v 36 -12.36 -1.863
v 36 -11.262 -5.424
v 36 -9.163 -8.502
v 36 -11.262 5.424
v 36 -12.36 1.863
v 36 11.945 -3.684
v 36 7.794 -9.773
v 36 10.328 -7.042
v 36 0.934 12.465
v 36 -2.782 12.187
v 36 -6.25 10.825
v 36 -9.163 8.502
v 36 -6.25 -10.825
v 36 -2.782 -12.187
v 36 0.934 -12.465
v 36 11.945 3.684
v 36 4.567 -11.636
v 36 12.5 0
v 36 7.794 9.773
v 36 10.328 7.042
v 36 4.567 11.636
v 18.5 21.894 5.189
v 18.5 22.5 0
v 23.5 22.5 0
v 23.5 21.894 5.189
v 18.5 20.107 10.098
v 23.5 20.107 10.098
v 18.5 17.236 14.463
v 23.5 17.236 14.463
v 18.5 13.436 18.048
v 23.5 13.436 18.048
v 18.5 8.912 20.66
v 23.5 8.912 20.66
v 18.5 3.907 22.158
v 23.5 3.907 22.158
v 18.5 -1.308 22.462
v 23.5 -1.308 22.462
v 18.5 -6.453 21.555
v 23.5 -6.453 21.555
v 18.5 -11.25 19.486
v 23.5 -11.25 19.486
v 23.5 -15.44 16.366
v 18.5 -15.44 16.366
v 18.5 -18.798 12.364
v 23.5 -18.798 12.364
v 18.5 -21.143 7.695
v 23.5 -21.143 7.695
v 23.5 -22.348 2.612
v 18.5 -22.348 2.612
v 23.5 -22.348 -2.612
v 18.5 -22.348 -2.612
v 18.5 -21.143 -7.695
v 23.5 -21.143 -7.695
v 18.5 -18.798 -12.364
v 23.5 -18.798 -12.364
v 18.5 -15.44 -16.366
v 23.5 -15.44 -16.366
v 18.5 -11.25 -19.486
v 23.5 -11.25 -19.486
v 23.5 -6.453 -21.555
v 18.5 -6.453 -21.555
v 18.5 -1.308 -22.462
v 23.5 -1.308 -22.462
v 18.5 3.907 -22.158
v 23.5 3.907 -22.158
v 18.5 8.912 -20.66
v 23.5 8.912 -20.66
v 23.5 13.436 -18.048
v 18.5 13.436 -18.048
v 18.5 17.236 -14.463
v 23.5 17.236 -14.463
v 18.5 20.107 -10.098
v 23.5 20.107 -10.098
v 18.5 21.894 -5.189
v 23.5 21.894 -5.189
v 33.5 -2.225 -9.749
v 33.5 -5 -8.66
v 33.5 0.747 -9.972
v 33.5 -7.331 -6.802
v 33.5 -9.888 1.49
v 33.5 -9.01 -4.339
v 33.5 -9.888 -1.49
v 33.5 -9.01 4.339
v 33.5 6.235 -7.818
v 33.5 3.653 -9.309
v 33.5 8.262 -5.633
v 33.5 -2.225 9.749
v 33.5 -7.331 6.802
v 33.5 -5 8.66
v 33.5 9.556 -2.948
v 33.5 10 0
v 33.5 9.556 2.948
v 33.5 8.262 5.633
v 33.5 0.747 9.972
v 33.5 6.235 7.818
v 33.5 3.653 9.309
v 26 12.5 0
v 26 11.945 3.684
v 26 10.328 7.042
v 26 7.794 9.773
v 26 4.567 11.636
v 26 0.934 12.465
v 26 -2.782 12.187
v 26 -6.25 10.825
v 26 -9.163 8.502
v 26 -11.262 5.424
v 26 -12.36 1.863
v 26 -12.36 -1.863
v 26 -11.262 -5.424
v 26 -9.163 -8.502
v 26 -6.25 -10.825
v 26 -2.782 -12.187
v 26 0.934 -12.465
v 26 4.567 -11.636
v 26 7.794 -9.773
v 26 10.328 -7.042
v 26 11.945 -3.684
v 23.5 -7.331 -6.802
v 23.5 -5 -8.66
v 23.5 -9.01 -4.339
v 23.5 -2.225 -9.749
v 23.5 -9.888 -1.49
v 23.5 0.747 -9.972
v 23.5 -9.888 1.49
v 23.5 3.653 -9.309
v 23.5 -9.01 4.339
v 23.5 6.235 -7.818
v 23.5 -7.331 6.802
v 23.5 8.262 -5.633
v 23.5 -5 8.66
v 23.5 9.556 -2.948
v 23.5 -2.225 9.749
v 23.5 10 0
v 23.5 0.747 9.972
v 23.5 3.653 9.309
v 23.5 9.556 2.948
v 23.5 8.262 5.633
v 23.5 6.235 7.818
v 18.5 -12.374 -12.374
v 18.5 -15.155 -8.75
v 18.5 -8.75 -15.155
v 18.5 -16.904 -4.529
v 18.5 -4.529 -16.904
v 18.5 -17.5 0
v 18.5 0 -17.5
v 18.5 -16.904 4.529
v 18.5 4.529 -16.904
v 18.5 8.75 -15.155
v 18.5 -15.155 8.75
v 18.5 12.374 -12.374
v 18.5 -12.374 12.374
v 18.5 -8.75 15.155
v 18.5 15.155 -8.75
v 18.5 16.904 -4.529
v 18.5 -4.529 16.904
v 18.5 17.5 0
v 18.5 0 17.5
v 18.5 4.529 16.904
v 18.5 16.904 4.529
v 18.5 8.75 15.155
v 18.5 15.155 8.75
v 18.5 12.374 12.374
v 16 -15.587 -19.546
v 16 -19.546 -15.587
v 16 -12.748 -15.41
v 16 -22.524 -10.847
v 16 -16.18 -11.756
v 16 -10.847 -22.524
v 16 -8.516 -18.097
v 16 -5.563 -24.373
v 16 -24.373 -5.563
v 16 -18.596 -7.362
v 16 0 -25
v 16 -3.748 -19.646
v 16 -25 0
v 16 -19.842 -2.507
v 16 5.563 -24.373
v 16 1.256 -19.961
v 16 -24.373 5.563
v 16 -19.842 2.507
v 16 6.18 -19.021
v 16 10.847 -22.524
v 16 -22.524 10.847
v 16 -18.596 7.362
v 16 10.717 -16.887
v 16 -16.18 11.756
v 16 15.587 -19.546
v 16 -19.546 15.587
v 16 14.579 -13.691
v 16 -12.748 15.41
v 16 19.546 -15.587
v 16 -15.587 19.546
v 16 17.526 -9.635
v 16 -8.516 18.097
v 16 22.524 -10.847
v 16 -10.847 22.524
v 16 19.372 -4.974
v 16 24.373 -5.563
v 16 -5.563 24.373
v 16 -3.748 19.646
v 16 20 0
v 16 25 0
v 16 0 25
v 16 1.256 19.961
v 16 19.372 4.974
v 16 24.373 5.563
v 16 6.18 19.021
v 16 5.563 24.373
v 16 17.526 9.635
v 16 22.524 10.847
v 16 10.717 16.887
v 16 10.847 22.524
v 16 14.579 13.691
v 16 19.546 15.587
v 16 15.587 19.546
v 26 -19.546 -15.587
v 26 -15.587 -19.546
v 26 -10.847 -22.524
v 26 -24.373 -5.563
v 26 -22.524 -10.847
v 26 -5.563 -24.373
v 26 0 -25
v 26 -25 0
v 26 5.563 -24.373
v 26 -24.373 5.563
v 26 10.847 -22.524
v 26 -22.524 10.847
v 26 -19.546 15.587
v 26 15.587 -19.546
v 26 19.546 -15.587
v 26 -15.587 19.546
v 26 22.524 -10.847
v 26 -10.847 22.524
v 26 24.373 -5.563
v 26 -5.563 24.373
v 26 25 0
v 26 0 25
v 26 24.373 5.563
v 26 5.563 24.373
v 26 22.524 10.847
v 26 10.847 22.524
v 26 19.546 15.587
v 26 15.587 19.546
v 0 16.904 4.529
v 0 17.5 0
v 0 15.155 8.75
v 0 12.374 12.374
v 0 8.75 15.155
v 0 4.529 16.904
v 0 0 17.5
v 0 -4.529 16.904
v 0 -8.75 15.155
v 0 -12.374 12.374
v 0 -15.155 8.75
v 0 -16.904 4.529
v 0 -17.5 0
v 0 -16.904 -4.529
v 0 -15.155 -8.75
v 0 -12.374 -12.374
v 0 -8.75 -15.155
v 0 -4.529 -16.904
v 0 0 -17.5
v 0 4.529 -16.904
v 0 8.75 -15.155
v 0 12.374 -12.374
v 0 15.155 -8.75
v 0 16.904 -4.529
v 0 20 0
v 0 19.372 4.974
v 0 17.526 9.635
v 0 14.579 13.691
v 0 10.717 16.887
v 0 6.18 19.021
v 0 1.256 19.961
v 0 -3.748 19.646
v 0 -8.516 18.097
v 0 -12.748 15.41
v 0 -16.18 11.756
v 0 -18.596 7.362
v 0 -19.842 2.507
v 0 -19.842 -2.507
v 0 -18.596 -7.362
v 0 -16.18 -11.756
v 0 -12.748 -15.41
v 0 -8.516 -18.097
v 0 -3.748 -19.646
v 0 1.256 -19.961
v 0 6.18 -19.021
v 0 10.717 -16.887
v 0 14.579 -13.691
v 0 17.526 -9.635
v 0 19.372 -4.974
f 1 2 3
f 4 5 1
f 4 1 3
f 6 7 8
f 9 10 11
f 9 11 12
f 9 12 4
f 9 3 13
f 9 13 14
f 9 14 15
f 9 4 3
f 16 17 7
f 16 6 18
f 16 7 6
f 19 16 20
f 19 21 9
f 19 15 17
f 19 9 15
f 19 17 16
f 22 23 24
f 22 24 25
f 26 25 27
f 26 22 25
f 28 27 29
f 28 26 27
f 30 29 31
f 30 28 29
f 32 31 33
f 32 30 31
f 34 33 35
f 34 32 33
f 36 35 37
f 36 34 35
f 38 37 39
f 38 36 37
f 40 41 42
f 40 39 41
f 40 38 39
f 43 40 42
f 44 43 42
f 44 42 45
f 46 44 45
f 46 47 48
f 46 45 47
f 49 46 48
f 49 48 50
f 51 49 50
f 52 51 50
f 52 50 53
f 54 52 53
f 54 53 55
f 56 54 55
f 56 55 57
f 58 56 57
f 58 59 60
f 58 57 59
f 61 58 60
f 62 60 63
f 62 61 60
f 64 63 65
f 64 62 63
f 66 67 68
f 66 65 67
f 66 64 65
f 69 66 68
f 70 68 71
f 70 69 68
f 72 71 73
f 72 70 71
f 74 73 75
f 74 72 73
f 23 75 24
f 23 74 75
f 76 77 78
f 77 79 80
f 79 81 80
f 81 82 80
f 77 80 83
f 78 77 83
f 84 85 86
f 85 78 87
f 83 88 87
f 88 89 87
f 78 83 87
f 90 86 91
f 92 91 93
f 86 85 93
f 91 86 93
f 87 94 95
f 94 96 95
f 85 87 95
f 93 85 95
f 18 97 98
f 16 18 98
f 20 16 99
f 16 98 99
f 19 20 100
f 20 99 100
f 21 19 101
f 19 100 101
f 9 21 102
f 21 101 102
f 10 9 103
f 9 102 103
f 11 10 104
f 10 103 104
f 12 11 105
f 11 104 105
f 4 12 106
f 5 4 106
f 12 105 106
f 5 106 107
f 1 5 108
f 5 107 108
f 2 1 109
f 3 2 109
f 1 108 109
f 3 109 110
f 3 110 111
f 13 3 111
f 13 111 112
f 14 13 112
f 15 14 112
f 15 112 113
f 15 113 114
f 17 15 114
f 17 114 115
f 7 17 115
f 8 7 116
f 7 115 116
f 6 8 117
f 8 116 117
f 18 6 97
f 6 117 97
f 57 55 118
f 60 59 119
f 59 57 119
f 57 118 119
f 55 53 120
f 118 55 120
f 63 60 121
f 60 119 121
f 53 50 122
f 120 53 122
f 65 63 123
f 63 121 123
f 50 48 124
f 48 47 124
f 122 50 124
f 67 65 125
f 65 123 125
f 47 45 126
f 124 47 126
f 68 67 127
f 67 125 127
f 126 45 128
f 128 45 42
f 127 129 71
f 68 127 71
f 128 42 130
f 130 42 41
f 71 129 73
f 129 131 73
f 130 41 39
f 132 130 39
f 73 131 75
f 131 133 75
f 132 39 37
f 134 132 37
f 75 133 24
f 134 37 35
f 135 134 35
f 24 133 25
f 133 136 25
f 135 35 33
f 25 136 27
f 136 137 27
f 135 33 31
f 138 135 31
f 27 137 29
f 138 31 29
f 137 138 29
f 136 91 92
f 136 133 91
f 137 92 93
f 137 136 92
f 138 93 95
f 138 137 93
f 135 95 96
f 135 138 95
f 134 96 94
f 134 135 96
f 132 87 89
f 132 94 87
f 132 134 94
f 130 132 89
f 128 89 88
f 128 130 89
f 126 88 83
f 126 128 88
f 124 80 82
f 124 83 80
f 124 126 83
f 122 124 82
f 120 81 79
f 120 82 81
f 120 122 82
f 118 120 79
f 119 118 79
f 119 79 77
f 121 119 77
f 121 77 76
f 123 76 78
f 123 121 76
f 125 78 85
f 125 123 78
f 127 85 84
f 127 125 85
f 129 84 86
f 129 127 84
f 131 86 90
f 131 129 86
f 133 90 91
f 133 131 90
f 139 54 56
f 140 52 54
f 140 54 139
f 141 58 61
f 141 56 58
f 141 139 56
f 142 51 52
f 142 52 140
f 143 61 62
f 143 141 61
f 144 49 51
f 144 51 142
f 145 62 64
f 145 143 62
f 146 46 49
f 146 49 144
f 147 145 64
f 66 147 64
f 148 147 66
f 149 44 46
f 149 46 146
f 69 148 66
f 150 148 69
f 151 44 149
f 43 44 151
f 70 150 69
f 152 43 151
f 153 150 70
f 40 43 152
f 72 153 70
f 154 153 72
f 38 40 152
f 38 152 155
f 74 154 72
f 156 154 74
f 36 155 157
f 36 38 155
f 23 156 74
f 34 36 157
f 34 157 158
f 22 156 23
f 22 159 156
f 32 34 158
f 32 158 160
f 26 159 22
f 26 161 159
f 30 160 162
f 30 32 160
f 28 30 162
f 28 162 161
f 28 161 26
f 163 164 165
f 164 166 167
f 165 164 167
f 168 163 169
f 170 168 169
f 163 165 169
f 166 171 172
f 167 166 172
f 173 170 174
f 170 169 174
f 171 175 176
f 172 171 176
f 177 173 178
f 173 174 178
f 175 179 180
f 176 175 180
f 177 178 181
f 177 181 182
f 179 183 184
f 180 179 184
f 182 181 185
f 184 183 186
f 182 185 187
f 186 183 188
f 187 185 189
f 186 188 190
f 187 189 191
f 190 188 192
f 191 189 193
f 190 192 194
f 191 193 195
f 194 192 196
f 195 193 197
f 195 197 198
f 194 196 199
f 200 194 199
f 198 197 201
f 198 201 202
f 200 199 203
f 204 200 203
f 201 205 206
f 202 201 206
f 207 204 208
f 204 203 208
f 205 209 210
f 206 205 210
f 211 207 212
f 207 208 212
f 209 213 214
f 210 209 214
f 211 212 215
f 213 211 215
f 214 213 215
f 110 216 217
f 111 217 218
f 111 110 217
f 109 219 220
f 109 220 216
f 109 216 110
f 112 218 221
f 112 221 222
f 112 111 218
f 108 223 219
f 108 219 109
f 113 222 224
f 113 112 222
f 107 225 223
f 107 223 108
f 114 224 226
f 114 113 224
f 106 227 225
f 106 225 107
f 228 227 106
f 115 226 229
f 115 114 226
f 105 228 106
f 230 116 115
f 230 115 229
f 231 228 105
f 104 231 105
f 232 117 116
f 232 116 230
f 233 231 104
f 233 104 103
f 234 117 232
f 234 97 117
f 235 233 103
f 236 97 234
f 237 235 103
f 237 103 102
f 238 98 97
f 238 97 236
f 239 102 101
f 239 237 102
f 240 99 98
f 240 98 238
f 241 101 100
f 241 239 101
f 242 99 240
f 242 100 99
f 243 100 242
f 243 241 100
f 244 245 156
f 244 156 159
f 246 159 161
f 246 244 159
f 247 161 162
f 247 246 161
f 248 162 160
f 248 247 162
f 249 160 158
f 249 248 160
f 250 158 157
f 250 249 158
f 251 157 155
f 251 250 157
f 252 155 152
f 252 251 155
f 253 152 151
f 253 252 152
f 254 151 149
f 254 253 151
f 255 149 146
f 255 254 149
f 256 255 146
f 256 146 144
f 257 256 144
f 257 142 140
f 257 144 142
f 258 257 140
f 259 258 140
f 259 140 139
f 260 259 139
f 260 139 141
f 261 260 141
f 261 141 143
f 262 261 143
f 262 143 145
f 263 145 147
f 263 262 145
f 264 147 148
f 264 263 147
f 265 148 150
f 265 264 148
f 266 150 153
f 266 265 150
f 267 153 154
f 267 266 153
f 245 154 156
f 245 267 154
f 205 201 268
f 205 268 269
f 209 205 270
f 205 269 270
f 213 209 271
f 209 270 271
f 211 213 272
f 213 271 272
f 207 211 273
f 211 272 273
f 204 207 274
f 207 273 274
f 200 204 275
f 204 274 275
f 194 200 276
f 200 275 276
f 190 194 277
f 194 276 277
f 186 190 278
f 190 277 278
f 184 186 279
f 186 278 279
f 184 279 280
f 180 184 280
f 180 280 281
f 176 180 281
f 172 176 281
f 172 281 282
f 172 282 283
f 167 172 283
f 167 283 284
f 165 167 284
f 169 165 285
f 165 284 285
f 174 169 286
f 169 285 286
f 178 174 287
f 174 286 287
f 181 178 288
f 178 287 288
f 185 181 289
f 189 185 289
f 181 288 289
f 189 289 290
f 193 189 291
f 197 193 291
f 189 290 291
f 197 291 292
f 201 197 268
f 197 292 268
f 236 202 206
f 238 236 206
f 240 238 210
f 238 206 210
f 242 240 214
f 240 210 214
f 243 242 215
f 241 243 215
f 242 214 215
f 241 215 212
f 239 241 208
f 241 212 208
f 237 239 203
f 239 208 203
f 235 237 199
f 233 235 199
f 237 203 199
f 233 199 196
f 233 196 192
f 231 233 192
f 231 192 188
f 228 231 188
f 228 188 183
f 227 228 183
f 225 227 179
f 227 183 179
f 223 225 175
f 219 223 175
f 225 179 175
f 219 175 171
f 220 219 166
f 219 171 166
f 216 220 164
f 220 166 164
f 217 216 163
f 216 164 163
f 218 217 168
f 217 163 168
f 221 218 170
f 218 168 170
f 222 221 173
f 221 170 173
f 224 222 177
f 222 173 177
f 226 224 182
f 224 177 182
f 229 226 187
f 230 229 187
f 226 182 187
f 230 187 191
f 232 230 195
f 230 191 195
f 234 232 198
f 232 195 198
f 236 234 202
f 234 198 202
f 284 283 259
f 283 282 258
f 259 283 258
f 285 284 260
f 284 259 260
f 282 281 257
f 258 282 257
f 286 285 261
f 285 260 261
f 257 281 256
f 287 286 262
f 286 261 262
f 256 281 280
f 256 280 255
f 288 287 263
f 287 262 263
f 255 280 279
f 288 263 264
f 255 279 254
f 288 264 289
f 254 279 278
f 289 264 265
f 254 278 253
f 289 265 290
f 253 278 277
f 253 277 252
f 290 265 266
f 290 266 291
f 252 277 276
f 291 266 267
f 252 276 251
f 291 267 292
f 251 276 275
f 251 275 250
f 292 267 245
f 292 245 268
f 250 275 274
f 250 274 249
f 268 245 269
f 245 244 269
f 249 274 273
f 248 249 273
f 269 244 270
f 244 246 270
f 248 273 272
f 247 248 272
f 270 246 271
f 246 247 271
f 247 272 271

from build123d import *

# Parameters (mm, degrees)
F0_R     = 20
F1_DEPTH = 16
F2_R     = 25
F2_R_2   = 20
F3_DEPTH = 10
F4_R     = 12.5
F5_DEPTH = 10
F6_T     = -2.5


with BuildPart() as f1:
    # F0 (on Right) → F1 (new body)
    with BuildSketch(Plane.YZ):
        Circle(F0_R)
    extrude(amount=F1_DEPTH)

    # F2 (on face) → F3 (join)
    with BuildSketch(Plane.YZ.offset(16)):
        Circle(F2_R)
        Circle(F2_R_2, mode=Mode.SUBTRACT)
        Circle(F2_R_2)
    extrude(amount=F3_DEPTH)

    # F4 (on face) → F5 (join)
    with BuildSketch(Plane.YZ.offset(26)):
        Circle(F4_R)
    extrude(amount=F5_DEPTH)

    # F6
    f6_openings = [f1.faces().sort_by_distance(p)[0] for p in [
        (0, 0, 0),
    ]]
    offset(amount=F6_T, openings=f6_openings, kind=Kind.INTERSECTION)


solid = f1.part
